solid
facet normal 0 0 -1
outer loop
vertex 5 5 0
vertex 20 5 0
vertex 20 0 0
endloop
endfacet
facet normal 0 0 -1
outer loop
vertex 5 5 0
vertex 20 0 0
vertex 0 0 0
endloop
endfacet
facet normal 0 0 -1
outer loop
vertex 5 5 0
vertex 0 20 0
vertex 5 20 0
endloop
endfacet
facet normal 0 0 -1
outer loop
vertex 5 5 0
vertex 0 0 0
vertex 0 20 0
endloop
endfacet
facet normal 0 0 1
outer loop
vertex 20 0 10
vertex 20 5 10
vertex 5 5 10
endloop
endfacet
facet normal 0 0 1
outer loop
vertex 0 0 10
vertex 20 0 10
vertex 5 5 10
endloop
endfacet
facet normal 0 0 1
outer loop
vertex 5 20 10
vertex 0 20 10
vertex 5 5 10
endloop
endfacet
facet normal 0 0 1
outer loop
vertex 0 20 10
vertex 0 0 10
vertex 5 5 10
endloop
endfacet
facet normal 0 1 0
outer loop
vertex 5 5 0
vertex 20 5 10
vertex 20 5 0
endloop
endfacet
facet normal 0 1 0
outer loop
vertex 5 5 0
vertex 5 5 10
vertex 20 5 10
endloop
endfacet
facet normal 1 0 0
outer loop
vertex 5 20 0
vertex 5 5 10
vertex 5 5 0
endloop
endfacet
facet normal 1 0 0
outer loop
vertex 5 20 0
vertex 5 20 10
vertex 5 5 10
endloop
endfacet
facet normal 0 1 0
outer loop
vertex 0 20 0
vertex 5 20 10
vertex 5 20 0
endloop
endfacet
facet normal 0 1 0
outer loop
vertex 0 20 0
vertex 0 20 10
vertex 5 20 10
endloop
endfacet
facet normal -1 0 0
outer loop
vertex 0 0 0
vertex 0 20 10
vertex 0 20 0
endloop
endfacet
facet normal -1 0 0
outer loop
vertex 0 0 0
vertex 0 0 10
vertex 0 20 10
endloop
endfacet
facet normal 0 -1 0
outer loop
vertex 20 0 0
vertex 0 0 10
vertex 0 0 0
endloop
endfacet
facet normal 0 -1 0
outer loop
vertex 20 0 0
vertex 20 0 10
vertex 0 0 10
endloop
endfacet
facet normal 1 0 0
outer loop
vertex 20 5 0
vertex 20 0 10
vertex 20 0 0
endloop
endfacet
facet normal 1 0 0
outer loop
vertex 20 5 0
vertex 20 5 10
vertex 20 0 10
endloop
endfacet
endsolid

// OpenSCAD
linear_extrude(10)polygon([[0,0],[20,0],[20,5],[5,5],[5,20],[0,20]]);
